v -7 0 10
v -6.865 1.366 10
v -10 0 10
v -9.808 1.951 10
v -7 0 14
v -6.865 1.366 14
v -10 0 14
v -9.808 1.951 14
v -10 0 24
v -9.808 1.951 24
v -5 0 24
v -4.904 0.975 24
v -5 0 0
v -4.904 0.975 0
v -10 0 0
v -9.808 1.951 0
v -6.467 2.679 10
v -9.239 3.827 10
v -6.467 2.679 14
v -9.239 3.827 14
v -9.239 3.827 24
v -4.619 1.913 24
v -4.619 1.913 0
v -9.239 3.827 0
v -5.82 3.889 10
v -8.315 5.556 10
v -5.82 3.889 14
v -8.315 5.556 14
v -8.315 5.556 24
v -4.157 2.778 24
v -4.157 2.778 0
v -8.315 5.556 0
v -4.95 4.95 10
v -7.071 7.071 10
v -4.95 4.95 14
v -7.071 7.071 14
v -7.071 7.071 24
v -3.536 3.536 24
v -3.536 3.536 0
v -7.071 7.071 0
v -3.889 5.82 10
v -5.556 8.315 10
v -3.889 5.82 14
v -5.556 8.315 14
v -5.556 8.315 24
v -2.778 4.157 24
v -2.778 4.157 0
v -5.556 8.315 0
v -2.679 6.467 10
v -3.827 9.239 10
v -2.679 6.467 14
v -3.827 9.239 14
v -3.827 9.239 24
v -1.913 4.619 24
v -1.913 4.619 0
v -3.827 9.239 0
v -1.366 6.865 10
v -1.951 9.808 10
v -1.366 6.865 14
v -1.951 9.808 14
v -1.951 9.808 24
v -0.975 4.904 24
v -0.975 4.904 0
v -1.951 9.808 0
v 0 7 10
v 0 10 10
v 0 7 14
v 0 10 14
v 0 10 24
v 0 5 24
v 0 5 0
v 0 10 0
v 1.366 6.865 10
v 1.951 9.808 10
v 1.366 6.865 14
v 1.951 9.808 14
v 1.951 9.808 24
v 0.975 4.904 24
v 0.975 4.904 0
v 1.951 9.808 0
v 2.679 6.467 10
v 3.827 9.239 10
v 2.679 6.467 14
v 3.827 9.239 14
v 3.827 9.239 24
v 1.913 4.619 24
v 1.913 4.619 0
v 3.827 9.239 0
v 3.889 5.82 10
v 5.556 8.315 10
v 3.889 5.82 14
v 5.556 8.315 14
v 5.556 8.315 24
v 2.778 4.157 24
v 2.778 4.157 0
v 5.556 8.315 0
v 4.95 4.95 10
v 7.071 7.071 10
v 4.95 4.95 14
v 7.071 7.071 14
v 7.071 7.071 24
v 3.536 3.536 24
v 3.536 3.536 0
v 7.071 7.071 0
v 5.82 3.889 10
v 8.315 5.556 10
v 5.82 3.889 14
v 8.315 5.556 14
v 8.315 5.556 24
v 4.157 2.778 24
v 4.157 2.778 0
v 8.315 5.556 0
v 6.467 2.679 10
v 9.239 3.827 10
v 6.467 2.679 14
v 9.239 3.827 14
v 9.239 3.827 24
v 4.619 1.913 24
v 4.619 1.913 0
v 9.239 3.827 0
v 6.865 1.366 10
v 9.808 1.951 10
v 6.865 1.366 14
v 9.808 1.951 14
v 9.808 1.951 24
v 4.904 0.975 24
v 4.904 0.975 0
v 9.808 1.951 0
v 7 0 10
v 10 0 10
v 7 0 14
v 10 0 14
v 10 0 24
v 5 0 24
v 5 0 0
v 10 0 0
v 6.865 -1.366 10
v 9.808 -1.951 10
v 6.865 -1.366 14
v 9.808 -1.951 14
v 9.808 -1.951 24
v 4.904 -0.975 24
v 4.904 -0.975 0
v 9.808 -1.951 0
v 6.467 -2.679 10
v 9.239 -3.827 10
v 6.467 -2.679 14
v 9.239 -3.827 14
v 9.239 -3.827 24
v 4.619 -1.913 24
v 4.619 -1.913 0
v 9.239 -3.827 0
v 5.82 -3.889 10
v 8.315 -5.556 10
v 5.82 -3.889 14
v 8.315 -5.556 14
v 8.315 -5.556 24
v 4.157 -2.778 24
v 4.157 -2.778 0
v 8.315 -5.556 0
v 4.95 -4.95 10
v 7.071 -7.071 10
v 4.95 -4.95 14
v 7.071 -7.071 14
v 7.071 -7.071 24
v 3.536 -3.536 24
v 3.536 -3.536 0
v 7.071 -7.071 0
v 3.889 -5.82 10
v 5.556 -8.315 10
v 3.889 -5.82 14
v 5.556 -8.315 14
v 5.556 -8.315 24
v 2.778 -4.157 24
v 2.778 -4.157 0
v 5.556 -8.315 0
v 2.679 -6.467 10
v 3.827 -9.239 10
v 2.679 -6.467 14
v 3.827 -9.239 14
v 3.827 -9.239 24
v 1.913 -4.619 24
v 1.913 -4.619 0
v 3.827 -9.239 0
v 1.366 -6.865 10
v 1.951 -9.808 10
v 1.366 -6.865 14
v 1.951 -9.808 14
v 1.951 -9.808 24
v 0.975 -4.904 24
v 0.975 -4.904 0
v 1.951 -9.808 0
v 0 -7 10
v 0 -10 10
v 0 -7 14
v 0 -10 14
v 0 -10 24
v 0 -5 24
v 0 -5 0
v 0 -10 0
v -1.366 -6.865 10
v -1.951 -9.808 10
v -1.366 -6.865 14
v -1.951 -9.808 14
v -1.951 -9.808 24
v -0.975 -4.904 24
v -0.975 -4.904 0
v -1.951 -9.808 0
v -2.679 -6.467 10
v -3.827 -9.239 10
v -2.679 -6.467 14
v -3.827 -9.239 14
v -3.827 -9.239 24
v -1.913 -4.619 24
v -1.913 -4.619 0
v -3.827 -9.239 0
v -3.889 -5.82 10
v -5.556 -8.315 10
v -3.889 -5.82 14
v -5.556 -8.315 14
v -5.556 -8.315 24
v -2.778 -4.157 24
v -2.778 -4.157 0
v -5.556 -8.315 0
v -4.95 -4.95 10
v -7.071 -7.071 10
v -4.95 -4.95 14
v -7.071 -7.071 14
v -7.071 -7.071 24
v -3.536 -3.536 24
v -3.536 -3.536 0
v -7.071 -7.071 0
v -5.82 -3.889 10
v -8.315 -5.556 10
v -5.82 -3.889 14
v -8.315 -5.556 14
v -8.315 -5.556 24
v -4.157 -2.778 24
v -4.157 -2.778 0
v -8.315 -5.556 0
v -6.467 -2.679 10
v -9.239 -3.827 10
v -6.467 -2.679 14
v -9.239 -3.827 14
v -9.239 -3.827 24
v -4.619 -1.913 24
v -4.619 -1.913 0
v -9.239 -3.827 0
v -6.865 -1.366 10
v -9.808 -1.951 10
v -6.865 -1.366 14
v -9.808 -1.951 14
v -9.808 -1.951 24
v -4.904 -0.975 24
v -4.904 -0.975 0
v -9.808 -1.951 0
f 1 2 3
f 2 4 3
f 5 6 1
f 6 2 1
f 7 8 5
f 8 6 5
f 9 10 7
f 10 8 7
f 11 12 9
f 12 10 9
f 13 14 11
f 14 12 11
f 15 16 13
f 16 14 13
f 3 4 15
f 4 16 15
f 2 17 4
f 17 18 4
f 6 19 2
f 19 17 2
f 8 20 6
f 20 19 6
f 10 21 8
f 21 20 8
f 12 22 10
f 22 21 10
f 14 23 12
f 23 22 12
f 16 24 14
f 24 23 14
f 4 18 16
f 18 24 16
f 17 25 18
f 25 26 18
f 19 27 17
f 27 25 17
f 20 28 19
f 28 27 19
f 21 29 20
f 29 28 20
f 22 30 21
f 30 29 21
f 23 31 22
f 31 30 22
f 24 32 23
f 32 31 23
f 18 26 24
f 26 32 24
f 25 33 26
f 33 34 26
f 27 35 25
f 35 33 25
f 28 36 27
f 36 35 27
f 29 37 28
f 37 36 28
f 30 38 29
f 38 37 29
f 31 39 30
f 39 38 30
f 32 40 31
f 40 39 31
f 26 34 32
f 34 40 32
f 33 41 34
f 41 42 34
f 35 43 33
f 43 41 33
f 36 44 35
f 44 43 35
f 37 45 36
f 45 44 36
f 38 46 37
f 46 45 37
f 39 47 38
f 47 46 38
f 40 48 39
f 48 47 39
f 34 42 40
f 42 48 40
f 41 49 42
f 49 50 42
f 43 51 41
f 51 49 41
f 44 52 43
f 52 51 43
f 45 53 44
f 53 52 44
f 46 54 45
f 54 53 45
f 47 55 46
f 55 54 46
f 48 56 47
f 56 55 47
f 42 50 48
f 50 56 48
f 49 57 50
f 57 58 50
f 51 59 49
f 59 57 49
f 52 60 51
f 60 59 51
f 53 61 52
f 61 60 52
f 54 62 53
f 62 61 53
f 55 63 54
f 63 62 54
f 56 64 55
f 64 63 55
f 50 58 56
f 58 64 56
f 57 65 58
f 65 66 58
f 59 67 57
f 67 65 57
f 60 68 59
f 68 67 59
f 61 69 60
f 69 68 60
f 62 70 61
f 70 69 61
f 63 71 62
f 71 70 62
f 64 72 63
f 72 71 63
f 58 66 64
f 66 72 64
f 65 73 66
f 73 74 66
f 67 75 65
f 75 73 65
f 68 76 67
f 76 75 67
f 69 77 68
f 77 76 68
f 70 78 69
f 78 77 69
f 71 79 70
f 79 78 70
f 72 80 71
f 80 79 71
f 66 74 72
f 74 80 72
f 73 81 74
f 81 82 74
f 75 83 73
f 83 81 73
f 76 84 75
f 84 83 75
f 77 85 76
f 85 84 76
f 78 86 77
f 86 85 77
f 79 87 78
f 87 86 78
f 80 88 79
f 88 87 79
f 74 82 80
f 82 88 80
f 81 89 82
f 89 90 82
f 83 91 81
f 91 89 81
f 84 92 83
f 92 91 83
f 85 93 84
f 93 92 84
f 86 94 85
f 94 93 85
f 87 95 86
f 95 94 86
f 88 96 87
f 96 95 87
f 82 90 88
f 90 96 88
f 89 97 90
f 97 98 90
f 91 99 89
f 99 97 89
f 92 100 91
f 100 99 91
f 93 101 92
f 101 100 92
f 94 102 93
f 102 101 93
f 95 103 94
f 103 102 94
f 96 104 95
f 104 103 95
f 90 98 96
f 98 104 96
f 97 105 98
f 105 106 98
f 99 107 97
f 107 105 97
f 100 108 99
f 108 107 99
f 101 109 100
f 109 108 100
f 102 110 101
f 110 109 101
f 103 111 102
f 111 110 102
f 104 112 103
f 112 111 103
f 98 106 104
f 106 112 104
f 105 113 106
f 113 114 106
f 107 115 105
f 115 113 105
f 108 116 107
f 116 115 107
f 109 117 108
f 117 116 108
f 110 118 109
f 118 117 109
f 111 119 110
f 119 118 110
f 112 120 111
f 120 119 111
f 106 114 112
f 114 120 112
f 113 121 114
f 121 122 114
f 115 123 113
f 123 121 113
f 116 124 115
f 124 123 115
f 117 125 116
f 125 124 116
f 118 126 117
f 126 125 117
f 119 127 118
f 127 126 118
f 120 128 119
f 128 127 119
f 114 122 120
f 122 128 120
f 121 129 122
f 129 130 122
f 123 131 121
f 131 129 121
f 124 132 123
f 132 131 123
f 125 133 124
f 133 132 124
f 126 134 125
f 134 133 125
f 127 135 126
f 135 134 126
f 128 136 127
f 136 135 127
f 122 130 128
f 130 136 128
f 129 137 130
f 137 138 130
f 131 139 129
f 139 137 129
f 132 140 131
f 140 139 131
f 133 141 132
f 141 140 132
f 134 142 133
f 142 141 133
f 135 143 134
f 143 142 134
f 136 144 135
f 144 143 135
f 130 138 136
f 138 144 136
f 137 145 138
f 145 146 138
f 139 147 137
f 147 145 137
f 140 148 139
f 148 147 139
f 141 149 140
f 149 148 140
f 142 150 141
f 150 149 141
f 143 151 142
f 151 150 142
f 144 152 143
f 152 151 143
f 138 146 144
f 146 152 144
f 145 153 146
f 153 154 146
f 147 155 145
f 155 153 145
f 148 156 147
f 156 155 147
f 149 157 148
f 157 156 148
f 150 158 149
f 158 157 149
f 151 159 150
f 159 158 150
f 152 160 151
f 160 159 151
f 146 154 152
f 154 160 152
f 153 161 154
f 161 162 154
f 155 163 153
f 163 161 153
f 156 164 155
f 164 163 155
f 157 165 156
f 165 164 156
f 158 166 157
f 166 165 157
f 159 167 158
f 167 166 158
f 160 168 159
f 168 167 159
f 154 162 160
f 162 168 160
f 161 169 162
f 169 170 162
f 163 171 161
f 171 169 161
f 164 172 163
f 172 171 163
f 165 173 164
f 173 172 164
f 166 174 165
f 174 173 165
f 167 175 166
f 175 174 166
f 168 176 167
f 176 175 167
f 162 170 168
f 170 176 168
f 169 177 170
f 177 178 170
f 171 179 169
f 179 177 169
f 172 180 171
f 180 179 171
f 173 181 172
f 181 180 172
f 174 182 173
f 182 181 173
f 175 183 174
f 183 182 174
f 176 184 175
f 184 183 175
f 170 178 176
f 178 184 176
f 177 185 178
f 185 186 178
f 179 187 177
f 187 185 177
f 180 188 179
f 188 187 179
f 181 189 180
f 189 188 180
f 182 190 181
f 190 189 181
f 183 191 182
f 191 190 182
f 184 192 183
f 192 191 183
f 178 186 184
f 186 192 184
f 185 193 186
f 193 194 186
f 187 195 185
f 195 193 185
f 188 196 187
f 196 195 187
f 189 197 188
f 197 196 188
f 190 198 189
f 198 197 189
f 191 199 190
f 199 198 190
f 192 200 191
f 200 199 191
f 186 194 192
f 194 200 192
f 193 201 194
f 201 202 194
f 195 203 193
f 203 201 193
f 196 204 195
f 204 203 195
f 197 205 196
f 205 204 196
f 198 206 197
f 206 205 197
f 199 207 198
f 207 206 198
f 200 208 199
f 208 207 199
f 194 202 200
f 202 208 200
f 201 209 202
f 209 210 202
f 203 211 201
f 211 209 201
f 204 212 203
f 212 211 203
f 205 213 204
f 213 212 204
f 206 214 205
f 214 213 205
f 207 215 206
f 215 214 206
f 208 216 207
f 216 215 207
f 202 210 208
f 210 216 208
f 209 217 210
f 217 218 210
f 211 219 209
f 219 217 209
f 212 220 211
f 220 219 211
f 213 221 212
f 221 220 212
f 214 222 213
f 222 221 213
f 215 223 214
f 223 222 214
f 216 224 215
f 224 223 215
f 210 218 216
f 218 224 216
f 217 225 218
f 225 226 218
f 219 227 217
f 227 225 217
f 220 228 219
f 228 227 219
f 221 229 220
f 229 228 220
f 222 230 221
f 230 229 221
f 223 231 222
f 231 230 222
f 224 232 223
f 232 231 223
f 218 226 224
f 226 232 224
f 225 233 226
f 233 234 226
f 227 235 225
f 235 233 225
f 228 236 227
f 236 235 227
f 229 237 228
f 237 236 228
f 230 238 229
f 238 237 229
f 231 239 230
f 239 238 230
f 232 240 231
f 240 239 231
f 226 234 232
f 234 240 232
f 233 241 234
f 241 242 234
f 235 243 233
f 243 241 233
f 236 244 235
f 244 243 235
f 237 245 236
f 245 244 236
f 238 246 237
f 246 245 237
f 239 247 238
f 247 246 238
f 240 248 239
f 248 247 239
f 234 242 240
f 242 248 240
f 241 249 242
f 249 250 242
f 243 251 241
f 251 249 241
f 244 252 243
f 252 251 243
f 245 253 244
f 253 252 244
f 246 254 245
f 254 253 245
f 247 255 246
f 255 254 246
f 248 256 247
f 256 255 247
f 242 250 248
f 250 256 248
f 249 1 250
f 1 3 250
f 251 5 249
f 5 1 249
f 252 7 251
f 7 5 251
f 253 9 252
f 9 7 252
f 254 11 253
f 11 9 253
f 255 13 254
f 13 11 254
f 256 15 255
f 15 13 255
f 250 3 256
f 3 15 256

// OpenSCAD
$fn = 32;

// ----------------------------------------------------------------------
// Grooved revolve: stepped, bore R5
// ----------------------------------------------------------------------

// --- parameters (mm) ---
bore_r = 5;               // bore radius
outer_r = 10;             // outer radius of the body
total_h = 24;             // overall height, Z
wall = 5;                 // radial wall thickness
groove_w = 4;             // groove width
groove_d = 3;             // groove depth
grooves = 1;              // number of outer grooves

bbox_x = 2 * outer_r;  // full diameter
bore_d = 2 * bore_r;  // bore diameter
body_d = 2 * outer_r;  // body diameter
revolve_angle = 360;  // full turn around the Z axis

profile = [[5, 0], [10, 0], [10, 10], [7, 10], [7, 14], [10, 14], [10, 24], [5, 24]];  // primary outline, 8 points, counter clockwise

// --- the one profile operation ---
rotate_extrude(angle = revolve_angle) polygon(points = profile);
